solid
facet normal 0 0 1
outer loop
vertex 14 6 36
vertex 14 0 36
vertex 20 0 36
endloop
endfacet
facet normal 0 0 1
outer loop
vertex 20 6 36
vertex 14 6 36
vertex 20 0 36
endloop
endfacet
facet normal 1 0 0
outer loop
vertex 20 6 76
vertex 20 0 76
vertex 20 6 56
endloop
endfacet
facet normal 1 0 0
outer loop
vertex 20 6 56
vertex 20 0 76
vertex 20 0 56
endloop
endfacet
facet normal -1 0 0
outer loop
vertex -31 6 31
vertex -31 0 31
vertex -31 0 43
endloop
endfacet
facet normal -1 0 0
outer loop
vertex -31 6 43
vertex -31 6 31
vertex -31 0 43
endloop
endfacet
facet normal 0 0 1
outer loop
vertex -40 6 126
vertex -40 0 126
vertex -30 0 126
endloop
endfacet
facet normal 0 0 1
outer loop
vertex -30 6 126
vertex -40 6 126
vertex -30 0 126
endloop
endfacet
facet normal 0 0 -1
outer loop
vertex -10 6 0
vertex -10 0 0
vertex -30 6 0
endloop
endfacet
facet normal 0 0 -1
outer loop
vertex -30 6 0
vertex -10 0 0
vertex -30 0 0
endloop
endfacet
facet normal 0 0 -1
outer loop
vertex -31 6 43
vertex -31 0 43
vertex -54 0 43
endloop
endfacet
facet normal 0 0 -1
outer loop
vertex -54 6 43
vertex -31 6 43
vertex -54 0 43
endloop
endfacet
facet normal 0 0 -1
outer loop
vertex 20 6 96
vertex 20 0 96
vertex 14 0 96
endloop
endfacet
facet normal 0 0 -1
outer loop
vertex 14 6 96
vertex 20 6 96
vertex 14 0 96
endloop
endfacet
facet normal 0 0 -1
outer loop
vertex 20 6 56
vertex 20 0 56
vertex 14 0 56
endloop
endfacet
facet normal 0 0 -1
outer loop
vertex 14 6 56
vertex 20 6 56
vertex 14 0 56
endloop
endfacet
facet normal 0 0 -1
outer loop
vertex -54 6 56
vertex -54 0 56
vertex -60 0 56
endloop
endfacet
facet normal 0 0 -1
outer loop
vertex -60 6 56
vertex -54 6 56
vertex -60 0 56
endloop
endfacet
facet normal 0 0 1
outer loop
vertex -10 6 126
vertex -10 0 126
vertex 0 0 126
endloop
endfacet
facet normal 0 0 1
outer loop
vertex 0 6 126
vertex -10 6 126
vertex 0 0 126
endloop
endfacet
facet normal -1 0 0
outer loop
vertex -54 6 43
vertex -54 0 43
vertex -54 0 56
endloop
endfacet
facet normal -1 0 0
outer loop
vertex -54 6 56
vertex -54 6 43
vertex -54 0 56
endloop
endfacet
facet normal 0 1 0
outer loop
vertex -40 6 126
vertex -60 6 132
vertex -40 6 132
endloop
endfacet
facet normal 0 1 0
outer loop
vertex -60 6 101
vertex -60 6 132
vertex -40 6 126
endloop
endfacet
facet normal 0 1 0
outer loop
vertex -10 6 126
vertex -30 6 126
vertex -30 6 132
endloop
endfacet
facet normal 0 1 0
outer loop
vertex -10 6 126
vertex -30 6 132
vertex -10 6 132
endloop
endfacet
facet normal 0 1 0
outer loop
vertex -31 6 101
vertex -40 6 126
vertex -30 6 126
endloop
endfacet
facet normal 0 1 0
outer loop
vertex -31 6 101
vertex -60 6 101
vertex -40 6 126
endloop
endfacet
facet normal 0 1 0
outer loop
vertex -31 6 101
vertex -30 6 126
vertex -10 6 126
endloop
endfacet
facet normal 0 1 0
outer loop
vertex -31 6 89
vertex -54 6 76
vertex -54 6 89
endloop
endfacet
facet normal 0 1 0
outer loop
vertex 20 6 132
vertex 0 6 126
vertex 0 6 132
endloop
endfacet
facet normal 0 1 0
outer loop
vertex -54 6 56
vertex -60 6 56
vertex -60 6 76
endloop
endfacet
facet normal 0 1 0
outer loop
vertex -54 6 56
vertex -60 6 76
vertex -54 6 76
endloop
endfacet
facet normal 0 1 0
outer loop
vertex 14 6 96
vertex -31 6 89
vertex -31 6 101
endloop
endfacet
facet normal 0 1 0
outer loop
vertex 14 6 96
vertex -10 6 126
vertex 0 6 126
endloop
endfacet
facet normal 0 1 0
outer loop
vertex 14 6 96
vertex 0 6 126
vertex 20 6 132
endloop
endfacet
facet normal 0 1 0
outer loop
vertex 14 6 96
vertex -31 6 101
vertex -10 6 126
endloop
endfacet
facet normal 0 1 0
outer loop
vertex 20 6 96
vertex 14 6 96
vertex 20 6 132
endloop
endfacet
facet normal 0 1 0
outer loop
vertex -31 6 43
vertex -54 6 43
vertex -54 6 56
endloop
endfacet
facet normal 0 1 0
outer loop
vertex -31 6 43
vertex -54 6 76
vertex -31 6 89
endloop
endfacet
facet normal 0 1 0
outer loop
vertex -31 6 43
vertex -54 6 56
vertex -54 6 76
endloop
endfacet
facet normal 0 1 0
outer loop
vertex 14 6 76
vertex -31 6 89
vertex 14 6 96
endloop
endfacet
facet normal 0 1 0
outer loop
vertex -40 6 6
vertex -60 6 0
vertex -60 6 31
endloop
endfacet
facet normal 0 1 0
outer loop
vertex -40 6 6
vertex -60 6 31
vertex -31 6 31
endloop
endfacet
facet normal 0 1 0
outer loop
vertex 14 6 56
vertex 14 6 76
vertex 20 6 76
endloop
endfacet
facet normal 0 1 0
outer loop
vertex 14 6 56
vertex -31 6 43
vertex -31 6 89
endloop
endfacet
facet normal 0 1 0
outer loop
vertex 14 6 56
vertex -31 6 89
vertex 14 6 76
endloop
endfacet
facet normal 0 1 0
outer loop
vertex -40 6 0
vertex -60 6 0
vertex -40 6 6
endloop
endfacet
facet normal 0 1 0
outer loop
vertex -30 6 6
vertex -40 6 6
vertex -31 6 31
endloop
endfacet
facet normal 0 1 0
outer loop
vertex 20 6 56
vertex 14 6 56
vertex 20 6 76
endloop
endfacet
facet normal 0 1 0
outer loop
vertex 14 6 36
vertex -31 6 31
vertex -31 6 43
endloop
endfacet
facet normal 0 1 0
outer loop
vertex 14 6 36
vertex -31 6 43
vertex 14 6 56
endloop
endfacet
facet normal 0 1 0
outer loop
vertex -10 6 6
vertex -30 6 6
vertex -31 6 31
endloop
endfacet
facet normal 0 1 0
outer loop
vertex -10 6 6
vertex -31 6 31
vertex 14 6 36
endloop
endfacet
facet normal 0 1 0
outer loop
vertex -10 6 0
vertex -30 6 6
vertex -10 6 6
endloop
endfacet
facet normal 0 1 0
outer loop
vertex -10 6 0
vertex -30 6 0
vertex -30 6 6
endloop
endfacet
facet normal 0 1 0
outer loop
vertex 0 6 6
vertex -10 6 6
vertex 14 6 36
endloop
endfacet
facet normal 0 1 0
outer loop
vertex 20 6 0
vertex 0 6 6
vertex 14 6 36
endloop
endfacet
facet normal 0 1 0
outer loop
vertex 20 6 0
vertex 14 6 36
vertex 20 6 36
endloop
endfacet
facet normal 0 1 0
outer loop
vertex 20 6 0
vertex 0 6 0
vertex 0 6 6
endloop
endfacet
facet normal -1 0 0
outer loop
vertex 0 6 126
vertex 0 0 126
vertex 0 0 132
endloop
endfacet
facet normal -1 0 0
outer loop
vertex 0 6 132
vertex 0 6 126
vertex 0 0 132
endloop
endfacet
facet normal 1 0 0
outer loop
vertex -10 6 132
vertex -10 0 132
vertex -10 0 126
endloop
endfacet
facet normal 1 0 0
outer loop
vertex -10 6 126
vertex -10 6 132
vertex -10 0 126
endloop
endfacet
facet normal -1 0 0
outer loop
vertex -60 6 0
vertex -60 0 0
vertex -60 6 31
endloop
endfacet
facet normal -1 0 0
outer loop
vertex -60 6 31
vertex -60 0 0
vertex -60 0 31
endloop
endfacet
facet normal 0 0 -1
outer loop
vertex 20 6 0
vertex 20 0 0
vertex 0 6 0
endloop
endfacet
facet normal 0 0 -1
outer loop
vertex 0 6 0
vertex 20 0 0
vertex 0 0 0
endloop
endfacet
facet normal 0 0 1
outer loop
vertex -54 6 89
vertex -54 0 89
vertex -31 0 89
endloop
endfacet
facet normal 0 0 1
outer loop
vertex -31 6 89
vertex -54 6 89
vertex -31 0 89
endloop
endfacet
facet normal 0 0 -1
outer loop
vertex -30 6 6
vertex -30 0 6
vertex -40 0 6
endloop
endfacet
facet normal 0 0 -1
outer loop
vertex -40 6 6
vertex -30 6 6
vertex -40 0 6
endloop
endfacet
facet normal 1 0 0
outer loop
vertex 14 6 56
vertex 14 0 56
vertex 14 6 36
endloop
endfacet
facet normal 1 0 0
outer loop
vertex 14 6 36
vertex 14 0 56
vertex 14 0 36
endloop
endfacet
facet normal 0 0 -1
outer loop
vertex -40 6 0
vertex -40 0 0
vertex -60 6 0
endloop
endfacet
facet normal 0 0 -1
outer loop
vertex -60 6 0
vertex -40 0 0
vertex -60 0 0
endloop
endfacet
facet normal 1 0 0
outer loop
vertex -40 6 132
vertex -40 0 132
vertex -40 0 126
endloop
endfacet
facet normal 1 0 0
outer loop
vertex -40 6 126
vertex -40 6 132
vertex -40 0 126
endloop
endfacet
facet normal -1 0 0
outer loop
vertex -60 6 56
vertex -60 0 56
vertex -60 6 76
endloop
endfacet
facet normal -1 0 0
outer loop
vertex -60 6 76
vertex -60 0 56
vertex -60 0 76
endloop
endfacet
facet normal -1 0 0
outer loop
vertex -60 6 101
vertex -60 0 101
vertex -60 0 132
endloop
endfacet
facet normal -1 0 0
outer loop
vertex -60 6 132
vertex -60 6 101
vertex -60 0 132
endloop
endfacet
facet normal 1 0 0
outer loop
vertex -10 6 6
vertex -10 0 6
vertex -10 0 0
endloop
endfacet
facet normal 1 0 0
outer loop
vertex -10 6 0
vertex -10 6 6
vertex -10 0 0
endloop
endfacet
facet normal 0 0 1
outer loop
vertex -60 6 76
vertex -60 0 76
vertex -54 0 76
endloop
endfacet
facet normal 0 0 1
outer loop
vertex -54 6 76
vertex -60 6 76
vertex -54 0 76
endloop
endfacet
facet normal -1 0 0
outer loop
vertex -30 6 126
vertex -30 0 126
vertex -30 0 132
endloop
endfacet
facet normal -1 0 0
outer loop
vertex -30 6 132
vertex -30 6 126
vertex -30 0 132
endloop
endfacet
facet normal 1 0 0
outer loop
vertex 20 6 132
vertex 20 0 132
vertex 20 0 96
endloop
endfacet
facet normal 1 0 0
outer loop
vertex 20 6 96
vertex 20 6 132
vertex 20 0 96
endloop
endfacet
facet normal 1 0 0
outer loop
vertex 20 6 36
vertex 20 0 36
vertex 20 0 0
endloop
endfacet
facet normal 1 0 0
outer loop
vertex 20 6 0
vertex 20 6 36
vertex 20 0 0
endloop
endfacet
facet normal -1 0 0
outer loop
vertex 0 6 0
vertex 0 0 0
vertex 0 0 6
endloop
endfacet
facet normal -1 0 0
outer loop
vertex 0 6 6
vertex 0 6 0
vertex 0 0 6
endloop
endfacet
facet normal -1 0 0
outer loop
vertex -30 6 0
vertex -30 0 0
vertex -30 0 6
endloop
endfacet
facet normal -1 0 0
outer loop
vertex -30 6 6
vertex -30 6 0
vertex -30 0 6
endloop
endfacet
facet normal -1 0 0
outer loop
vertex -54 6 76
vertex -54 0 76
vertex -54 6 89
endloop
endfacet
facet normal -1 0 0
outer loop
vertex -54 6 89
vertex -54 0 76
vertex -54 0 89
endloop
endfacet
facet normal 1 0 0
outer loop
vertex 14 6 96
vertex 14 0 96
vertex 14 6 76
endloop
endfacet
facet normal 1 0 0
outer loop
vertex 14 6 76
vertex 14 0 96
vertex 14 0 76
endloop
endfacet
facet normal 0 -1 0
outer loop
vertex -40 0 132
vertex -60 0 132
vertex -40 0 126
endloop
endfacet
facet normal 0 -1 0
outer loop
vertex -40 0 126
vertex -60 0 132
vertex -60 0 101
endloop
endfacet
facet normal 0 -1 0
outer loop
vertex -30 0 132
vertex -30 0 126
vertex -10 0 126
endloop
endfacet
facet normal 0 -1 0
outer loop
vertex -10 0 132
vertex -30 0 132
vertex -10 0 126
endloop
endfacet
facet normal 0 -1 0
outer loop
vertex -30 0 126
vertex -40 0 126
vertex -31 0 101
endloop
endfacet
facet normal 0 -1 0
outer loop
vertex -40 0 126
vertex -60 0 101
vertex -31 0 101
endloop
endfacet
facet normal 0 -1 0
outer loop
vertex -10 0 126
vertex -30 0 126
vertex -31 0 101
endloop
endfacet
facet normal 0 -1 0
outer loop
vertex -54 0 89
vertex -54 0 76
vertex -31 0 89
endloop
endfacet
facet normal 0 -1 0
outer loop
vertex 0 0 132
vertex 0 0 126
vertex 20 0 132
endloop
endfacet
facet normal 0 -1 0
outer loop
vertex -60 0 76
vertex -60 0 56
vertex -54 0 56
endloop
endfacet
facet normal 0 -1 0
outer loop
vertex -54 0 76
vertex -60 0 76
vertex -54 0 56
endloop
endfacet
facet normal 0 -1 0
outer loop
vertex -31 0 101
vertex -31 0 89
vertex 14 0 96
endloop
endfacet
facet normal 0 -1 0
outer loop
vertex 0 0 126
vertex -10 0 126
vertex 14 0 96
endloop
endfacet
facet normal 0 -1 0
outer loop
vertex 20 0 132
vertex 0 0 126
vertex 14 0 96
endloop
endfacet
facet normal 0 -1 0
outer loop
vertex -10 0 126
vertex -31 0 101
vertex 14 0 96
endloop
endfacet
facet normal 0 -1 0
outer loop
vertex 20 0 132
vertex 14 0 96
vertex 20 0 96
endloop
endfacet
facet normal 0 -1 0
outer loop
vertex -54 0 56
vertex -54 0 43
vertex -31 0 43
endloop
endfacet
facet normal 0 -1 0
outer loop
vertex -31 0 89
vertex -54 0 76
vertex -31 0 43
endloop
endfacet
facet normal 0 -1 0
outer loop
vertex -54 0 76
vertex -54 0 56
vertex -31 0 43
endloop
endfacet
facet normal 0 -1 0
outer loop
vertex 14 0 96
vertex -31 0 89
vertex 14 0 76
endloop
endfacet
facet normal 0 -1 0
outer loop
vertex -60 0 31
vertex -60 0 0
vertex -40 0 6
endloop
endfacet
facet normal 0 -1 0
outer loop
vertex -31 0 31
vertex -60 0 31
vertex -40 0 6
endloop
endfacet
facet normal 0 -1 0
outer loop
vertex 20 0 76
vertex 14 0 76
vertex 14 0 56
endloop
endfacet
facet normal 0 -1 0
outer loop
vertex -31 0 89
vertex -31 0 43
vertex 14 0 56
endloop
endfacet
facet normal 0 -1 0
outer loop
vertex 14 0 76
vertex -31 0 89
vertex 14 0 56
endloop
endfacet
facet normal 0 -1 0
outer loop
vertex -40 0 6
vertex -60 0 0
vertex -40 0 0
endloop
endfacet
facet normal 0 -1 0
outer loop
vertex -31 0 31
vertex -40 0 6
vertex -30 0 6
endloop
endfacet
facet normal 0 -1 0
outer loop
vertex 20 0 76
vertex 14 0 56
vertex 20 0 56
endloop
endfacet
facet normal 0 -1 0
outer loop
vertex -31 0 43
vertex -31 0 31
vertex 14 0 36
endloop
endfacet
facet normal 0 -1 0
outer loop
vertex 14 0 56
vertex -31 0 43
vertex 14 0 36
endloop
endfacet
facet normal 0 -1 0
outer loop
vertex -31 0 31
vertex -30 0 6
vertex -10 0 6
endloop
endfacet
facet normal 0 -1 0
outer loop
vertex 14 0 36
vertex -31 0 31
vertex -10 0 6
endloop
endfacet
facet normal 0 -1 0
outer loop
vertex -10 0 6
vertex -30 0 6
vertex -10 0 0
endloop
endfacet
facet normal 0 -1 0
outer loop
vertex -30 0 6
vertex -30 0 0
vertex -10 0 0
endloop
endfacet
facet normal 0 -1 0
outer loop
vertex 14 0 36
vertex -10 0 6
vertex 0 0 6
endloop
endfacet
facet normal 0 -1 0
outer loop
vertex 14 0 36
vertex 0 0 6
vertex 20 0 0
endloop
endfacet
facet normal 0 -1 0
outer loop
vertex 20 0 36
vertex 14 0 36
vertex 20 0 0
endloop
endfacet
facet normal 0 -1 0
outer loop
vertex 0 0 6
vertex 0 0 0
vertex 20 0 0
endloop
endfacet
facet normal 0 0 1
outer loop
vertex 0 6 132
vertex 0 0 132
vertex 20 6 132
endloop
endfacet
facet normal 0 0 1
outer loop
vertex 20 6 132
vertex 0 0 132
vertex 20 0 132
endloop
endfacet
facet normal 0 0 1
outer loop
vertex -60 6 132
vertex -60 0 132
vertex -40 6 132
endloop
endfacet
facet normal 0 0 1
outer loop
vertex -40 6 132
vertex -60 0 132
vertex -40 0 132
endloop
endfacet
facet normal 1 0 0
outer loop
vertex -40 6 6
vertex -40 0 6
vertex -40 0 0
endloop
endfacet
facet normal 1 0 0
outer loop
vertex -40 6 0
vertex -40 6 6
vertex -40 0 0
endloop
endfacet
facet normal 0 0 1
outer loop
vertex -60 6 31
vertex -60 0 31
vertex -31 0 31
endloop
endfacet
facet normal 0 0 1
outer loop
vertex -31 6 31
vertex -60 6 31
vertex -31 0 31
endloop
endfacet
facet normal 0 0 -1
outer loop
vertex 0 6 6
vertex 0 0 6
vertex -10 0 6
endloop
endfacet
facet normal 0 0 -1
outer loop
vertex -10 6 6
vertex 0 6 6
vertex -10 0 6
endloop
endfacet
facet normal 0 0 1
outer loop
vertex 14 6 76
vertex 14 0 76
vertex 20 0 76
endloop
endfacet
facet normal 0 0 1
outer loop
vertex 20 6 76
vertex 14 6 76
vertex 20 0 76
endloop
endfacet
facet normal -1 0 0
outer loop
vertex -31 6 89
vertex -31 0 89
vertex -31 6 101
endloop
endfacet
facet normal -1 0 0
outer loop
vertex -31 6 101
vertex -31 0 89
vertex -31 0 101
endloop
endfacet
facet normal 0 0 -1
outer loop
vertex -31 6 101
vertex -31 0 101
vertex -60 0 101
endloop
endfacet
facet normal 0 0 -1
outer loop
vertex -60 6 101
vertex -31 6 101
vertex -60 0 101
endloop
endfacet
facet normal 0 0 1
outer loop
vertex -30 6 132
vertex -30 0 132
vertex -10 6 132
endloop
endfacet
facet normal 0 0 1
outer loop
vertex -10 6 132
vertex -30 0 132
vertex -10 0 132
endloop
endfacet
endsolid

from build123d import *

# Parameters (mm, degrees)
RESSALTO_EXTRUS_O9_DEPTH = 6


with BuildPart() as part:
    # Esboço1 → Ressalto-extrusão9 (new body)
    with BuildSketch(Plane(origin=(0, 0, 0), x_dir=(1, 0, 0), z_dir=(0, 1, 0))):
        Polygon((-40, -6), (-40, 0), (-60, 0), (-60, -30.999999612), (-31, -30.999999612), (-31, -42.999999612), (-31, -65.999999612), (-31, -88.999999612), (-31, -100.999999612), (-60, -100.999999612), (-60, -131.999999612), (-40, -131.999999612), (-40, -125.999999612), (-30, -125.999999612), (-30, -131.999999612), (-10, -131.999999612), (-10, -125.999999612), (0, -125.999999612), (0, -131.999999612), (20, -131.999999612), (20, -95.999999612), (14, -95.999999612), (14, -75.999999612), (20, -75.999999612), (20, -55.999999612), (14, -55.999999612), (14, -36), (20, -36), (20, 0), (0, 0), (0, -6), (-10, -6), (-10, 0), (-30, 0), (-30, -6), align=None)
        Polygon((-31, -65.999999612), (-31, -42.999999612), (-54, -42.999999612), (-54, -55.999999612), (-60, -55.999999612), (-60, -65.999999612), align=None)
        Polygon((-31, -88.999999612), (-31, -65.999999612), (-60, -65.999999612), (-60, -75.999999612), (-54, -75.999999612), (-54, -88.999999612), align=None)
    extrude(amount=RESSALTO_EXTRUS_O9_DEPTH)


solid = part.part
